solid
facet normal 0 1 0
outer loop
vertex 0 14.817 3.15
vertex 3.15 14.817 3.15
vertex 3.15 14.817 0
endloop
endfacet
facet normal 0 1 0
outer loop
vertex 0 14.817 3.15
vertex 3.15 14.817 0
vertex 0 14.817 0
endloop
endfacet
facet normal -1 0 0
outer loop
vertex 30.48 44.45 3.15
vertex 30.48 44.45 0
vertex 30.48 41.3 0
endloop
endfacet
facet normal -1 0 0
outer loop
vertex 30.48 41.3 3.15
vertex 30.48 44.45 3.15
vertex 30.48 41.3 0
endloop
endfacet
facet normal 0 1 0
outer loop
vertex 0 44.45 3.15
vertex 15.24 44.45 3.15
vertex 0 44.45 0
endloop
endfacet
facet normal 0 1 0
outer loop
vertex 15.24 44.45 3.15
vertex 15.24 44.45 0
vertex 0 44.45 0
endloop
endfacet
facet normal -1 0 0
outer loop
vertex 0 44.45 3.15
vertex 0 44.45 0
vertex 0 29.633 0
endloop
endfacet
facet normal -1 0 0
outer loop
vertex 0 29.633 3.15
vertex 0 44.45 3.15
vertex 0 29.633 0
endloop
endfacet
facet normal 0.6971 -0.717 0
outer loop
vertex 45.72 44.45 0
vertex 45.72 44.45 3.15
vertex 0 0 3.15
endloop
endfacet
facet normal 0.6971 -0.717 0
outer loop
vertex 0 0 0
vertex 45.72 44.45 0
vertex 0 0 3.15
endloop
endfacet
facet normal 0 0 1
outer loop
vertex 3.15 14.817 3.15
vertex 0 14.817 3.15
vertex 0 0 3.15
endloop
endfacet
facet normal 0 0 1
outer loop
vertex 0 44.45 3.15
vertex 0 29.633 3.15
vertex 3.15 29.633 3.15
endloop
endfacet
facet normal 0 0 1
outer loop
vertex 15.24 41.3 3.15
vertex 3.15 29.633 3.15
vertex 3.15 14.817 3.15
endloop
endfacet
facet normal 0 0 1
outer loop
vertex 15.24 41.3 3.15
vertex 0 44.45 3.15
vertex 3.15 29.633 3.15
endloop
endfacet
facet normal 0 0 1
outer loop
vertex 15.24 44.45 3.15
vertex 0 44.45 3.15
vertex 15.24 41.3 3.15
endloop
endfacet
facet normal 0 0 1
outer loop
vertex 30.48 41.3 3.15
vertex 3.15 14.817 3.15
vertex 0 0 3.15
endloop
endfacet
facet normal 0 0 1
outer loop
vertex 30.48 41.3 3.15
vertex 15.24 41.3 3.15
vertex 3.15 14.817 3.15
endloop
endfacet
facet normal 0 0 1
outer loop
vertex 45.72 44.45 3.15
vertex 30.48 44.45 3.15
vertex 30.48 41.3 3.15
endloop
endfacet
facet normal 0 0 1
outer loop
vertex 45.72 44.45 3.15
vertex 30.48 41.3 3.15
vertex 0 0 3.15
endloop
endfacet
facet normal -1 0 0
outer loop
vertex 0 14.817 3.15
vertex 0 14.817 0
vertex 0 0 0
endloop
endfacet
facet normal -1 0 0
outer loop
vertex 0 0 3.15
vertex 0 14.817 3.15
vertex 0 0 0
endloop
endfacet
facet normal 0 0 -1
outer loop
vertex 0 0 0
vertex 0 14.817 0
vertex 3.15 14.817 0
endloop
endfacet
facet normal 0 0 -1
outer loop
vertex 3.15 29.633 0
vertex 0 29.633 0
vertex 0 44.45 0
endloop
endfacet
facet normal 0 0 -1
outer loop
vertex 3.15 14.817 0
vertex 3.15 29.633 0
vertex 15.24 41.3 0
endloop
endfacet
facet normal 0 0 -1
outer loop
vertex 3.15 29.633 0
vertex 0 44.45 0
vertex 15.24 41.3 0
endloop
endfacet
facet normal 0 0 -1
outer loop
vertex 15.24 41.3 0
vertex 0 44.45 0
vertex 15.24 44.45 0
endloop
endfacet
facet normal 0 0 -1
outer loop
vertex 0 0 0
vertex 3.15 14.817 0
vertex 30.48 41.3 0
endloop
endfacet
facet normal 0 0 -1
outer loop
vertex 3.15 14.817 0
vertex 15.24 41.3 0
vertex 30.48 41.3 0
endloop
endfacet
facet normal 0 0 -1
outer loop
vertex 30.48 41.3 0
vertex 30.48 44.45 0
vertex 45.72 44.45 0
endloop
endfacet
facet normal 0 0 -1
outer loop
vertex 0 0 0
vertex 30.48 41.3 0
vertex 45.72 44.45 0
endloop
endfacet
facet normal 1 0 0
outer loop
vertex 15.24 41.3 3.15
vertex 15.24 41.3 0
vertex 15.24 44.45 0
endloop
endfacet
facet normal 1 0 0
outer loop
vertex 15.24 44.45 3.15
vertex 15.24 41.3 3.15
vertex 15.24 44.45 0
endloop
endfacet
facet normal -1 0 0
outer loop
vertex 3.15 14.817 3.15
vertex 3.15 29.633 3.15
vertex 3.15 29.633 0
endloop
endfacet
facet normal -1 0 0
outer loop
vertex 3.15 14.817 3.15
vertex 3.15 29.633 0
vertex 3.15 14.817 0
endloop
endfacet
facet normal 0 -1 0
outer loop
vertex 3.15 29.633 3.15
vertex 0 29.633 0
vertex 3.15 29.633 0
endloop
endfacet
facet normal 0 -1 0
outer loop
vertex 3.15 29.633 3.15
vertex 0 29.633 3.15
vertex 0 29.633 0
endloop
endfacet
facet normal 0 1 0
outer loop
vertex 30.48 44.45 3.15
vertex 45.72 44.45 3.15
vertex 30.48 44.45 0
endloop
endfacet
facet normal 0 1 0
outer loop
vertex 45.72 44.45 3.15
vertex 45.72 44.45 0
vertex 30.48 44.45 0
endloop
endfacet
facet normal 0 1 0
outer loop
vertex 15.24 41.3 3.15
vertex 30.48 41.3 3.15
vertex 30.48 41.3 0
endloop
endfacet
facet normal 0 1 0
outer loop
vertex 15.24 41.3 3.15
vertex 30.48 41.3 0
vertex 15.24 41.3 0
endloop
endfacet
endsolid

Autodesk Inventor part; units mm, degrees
ref_plane "YZ Plane" through (0, 0, 0) normal (1, 0, 0) x (0, 1, 0)
ref_plane "XZ Plane" through (0, 0, 0) normal (0, 1, 0) x (-1, 0, 0)
ref_plane "XY Plane" through (0, 0, 0) normal (0, 0, 1) x (1, 0, 0)
sketch "Sketch1" plane through (0, 0, 0) normal (0, 0, 1) x (1, 0, 0)
  line L0 (0, 0) -> (45.72, 0)
  line L1 (45.72, 0) -> (45.72, 44.45)
  line L2 (45.72, 44.45) -> (0, 44.45)
  line L3 (0, 44.45) -> (0, 0)
  dimension "d0" = 45.72
  dimension "d1" = 44.45
extrude "Extrusion1" add sketch "Sketch1" along normal blind 3.1496
sketch "Sketch2" plane through (0, 0, 3.1496) normal (0, 0, 1) x (1, 0, 0)
  line L0 (45.72, 44.45) -> (0, 44.45) projected
  line L1 (0, 44.45) -> (0, 0) projected
  line L2 (15.24, 44.45) -> (30.48, 44.45)
  line L3 (30.48, 44.45) -> (30.48, 41.3004)
  line L4 (30.48, 41.3004) -> (15.24, 41.3004)
  line L5 (15.24, 41.3004) -> (15.24, 44.45)
  line L6 (0, 29.6333) -> (3.1496, 29.6333)
  line L7 (3.1496, 29.6333) -> (3.1496, 14.8167)
  line L8 (3.1496, 14.8167) -> (0, 14.8167)
  line L9 (0, 14.8167) -> (0, 29.6333)
  dimension "d4" = 15.24
  dimension "d5" = 3.1496
  dimension "d6" = 15.24
  dimension "d7" = 3.1496
  dimension "d8" = 14.8167
  dimension "d9" = 14.8167
extrude "Extrusion2" cut sketch "Sketch2" against normal blind 3.1496
sketch "Sketch3" plane through (0, 0, 3.1496) normal (0, 0, 1) x (1, 0, 0)
  line L0 (0, 0) -> (45.72, 0) projected
  line L1 (45.72, 0) -> (45.72, 44.45) projected
  line L2 (45.72, 44.45) -> (0, 0)
  line L3 (45.72, 0) -> (45.72, 44.45)
extrude "Extrusion3" cut sketch "Sketch3" against normal blind 3.1496
equation "\"d0\" = angleLength"
equation "\"d1\" = angleHeight"
equation "\"d2\" = thick"
equation "\"d4\" = 0.333333 * angleLength"
equation "\"d5\" = thick"
equation "\"d6\" = 0.333333 * angleLength"
equation "\"d7\" = thick"
equation "\"d8\" = 0.333333 * angleHeight"
equation "\"d9\" = 0.333333 * angleHeight"
equation "\"d10\" = thick"
equation "\"d12\" = thick"
equation "\"thick\" = 3.1496"
equation "\"angleLength\" = 45.72"
equation "\"angleHeight\" = 44.45"
properties part number "AngleSide"
